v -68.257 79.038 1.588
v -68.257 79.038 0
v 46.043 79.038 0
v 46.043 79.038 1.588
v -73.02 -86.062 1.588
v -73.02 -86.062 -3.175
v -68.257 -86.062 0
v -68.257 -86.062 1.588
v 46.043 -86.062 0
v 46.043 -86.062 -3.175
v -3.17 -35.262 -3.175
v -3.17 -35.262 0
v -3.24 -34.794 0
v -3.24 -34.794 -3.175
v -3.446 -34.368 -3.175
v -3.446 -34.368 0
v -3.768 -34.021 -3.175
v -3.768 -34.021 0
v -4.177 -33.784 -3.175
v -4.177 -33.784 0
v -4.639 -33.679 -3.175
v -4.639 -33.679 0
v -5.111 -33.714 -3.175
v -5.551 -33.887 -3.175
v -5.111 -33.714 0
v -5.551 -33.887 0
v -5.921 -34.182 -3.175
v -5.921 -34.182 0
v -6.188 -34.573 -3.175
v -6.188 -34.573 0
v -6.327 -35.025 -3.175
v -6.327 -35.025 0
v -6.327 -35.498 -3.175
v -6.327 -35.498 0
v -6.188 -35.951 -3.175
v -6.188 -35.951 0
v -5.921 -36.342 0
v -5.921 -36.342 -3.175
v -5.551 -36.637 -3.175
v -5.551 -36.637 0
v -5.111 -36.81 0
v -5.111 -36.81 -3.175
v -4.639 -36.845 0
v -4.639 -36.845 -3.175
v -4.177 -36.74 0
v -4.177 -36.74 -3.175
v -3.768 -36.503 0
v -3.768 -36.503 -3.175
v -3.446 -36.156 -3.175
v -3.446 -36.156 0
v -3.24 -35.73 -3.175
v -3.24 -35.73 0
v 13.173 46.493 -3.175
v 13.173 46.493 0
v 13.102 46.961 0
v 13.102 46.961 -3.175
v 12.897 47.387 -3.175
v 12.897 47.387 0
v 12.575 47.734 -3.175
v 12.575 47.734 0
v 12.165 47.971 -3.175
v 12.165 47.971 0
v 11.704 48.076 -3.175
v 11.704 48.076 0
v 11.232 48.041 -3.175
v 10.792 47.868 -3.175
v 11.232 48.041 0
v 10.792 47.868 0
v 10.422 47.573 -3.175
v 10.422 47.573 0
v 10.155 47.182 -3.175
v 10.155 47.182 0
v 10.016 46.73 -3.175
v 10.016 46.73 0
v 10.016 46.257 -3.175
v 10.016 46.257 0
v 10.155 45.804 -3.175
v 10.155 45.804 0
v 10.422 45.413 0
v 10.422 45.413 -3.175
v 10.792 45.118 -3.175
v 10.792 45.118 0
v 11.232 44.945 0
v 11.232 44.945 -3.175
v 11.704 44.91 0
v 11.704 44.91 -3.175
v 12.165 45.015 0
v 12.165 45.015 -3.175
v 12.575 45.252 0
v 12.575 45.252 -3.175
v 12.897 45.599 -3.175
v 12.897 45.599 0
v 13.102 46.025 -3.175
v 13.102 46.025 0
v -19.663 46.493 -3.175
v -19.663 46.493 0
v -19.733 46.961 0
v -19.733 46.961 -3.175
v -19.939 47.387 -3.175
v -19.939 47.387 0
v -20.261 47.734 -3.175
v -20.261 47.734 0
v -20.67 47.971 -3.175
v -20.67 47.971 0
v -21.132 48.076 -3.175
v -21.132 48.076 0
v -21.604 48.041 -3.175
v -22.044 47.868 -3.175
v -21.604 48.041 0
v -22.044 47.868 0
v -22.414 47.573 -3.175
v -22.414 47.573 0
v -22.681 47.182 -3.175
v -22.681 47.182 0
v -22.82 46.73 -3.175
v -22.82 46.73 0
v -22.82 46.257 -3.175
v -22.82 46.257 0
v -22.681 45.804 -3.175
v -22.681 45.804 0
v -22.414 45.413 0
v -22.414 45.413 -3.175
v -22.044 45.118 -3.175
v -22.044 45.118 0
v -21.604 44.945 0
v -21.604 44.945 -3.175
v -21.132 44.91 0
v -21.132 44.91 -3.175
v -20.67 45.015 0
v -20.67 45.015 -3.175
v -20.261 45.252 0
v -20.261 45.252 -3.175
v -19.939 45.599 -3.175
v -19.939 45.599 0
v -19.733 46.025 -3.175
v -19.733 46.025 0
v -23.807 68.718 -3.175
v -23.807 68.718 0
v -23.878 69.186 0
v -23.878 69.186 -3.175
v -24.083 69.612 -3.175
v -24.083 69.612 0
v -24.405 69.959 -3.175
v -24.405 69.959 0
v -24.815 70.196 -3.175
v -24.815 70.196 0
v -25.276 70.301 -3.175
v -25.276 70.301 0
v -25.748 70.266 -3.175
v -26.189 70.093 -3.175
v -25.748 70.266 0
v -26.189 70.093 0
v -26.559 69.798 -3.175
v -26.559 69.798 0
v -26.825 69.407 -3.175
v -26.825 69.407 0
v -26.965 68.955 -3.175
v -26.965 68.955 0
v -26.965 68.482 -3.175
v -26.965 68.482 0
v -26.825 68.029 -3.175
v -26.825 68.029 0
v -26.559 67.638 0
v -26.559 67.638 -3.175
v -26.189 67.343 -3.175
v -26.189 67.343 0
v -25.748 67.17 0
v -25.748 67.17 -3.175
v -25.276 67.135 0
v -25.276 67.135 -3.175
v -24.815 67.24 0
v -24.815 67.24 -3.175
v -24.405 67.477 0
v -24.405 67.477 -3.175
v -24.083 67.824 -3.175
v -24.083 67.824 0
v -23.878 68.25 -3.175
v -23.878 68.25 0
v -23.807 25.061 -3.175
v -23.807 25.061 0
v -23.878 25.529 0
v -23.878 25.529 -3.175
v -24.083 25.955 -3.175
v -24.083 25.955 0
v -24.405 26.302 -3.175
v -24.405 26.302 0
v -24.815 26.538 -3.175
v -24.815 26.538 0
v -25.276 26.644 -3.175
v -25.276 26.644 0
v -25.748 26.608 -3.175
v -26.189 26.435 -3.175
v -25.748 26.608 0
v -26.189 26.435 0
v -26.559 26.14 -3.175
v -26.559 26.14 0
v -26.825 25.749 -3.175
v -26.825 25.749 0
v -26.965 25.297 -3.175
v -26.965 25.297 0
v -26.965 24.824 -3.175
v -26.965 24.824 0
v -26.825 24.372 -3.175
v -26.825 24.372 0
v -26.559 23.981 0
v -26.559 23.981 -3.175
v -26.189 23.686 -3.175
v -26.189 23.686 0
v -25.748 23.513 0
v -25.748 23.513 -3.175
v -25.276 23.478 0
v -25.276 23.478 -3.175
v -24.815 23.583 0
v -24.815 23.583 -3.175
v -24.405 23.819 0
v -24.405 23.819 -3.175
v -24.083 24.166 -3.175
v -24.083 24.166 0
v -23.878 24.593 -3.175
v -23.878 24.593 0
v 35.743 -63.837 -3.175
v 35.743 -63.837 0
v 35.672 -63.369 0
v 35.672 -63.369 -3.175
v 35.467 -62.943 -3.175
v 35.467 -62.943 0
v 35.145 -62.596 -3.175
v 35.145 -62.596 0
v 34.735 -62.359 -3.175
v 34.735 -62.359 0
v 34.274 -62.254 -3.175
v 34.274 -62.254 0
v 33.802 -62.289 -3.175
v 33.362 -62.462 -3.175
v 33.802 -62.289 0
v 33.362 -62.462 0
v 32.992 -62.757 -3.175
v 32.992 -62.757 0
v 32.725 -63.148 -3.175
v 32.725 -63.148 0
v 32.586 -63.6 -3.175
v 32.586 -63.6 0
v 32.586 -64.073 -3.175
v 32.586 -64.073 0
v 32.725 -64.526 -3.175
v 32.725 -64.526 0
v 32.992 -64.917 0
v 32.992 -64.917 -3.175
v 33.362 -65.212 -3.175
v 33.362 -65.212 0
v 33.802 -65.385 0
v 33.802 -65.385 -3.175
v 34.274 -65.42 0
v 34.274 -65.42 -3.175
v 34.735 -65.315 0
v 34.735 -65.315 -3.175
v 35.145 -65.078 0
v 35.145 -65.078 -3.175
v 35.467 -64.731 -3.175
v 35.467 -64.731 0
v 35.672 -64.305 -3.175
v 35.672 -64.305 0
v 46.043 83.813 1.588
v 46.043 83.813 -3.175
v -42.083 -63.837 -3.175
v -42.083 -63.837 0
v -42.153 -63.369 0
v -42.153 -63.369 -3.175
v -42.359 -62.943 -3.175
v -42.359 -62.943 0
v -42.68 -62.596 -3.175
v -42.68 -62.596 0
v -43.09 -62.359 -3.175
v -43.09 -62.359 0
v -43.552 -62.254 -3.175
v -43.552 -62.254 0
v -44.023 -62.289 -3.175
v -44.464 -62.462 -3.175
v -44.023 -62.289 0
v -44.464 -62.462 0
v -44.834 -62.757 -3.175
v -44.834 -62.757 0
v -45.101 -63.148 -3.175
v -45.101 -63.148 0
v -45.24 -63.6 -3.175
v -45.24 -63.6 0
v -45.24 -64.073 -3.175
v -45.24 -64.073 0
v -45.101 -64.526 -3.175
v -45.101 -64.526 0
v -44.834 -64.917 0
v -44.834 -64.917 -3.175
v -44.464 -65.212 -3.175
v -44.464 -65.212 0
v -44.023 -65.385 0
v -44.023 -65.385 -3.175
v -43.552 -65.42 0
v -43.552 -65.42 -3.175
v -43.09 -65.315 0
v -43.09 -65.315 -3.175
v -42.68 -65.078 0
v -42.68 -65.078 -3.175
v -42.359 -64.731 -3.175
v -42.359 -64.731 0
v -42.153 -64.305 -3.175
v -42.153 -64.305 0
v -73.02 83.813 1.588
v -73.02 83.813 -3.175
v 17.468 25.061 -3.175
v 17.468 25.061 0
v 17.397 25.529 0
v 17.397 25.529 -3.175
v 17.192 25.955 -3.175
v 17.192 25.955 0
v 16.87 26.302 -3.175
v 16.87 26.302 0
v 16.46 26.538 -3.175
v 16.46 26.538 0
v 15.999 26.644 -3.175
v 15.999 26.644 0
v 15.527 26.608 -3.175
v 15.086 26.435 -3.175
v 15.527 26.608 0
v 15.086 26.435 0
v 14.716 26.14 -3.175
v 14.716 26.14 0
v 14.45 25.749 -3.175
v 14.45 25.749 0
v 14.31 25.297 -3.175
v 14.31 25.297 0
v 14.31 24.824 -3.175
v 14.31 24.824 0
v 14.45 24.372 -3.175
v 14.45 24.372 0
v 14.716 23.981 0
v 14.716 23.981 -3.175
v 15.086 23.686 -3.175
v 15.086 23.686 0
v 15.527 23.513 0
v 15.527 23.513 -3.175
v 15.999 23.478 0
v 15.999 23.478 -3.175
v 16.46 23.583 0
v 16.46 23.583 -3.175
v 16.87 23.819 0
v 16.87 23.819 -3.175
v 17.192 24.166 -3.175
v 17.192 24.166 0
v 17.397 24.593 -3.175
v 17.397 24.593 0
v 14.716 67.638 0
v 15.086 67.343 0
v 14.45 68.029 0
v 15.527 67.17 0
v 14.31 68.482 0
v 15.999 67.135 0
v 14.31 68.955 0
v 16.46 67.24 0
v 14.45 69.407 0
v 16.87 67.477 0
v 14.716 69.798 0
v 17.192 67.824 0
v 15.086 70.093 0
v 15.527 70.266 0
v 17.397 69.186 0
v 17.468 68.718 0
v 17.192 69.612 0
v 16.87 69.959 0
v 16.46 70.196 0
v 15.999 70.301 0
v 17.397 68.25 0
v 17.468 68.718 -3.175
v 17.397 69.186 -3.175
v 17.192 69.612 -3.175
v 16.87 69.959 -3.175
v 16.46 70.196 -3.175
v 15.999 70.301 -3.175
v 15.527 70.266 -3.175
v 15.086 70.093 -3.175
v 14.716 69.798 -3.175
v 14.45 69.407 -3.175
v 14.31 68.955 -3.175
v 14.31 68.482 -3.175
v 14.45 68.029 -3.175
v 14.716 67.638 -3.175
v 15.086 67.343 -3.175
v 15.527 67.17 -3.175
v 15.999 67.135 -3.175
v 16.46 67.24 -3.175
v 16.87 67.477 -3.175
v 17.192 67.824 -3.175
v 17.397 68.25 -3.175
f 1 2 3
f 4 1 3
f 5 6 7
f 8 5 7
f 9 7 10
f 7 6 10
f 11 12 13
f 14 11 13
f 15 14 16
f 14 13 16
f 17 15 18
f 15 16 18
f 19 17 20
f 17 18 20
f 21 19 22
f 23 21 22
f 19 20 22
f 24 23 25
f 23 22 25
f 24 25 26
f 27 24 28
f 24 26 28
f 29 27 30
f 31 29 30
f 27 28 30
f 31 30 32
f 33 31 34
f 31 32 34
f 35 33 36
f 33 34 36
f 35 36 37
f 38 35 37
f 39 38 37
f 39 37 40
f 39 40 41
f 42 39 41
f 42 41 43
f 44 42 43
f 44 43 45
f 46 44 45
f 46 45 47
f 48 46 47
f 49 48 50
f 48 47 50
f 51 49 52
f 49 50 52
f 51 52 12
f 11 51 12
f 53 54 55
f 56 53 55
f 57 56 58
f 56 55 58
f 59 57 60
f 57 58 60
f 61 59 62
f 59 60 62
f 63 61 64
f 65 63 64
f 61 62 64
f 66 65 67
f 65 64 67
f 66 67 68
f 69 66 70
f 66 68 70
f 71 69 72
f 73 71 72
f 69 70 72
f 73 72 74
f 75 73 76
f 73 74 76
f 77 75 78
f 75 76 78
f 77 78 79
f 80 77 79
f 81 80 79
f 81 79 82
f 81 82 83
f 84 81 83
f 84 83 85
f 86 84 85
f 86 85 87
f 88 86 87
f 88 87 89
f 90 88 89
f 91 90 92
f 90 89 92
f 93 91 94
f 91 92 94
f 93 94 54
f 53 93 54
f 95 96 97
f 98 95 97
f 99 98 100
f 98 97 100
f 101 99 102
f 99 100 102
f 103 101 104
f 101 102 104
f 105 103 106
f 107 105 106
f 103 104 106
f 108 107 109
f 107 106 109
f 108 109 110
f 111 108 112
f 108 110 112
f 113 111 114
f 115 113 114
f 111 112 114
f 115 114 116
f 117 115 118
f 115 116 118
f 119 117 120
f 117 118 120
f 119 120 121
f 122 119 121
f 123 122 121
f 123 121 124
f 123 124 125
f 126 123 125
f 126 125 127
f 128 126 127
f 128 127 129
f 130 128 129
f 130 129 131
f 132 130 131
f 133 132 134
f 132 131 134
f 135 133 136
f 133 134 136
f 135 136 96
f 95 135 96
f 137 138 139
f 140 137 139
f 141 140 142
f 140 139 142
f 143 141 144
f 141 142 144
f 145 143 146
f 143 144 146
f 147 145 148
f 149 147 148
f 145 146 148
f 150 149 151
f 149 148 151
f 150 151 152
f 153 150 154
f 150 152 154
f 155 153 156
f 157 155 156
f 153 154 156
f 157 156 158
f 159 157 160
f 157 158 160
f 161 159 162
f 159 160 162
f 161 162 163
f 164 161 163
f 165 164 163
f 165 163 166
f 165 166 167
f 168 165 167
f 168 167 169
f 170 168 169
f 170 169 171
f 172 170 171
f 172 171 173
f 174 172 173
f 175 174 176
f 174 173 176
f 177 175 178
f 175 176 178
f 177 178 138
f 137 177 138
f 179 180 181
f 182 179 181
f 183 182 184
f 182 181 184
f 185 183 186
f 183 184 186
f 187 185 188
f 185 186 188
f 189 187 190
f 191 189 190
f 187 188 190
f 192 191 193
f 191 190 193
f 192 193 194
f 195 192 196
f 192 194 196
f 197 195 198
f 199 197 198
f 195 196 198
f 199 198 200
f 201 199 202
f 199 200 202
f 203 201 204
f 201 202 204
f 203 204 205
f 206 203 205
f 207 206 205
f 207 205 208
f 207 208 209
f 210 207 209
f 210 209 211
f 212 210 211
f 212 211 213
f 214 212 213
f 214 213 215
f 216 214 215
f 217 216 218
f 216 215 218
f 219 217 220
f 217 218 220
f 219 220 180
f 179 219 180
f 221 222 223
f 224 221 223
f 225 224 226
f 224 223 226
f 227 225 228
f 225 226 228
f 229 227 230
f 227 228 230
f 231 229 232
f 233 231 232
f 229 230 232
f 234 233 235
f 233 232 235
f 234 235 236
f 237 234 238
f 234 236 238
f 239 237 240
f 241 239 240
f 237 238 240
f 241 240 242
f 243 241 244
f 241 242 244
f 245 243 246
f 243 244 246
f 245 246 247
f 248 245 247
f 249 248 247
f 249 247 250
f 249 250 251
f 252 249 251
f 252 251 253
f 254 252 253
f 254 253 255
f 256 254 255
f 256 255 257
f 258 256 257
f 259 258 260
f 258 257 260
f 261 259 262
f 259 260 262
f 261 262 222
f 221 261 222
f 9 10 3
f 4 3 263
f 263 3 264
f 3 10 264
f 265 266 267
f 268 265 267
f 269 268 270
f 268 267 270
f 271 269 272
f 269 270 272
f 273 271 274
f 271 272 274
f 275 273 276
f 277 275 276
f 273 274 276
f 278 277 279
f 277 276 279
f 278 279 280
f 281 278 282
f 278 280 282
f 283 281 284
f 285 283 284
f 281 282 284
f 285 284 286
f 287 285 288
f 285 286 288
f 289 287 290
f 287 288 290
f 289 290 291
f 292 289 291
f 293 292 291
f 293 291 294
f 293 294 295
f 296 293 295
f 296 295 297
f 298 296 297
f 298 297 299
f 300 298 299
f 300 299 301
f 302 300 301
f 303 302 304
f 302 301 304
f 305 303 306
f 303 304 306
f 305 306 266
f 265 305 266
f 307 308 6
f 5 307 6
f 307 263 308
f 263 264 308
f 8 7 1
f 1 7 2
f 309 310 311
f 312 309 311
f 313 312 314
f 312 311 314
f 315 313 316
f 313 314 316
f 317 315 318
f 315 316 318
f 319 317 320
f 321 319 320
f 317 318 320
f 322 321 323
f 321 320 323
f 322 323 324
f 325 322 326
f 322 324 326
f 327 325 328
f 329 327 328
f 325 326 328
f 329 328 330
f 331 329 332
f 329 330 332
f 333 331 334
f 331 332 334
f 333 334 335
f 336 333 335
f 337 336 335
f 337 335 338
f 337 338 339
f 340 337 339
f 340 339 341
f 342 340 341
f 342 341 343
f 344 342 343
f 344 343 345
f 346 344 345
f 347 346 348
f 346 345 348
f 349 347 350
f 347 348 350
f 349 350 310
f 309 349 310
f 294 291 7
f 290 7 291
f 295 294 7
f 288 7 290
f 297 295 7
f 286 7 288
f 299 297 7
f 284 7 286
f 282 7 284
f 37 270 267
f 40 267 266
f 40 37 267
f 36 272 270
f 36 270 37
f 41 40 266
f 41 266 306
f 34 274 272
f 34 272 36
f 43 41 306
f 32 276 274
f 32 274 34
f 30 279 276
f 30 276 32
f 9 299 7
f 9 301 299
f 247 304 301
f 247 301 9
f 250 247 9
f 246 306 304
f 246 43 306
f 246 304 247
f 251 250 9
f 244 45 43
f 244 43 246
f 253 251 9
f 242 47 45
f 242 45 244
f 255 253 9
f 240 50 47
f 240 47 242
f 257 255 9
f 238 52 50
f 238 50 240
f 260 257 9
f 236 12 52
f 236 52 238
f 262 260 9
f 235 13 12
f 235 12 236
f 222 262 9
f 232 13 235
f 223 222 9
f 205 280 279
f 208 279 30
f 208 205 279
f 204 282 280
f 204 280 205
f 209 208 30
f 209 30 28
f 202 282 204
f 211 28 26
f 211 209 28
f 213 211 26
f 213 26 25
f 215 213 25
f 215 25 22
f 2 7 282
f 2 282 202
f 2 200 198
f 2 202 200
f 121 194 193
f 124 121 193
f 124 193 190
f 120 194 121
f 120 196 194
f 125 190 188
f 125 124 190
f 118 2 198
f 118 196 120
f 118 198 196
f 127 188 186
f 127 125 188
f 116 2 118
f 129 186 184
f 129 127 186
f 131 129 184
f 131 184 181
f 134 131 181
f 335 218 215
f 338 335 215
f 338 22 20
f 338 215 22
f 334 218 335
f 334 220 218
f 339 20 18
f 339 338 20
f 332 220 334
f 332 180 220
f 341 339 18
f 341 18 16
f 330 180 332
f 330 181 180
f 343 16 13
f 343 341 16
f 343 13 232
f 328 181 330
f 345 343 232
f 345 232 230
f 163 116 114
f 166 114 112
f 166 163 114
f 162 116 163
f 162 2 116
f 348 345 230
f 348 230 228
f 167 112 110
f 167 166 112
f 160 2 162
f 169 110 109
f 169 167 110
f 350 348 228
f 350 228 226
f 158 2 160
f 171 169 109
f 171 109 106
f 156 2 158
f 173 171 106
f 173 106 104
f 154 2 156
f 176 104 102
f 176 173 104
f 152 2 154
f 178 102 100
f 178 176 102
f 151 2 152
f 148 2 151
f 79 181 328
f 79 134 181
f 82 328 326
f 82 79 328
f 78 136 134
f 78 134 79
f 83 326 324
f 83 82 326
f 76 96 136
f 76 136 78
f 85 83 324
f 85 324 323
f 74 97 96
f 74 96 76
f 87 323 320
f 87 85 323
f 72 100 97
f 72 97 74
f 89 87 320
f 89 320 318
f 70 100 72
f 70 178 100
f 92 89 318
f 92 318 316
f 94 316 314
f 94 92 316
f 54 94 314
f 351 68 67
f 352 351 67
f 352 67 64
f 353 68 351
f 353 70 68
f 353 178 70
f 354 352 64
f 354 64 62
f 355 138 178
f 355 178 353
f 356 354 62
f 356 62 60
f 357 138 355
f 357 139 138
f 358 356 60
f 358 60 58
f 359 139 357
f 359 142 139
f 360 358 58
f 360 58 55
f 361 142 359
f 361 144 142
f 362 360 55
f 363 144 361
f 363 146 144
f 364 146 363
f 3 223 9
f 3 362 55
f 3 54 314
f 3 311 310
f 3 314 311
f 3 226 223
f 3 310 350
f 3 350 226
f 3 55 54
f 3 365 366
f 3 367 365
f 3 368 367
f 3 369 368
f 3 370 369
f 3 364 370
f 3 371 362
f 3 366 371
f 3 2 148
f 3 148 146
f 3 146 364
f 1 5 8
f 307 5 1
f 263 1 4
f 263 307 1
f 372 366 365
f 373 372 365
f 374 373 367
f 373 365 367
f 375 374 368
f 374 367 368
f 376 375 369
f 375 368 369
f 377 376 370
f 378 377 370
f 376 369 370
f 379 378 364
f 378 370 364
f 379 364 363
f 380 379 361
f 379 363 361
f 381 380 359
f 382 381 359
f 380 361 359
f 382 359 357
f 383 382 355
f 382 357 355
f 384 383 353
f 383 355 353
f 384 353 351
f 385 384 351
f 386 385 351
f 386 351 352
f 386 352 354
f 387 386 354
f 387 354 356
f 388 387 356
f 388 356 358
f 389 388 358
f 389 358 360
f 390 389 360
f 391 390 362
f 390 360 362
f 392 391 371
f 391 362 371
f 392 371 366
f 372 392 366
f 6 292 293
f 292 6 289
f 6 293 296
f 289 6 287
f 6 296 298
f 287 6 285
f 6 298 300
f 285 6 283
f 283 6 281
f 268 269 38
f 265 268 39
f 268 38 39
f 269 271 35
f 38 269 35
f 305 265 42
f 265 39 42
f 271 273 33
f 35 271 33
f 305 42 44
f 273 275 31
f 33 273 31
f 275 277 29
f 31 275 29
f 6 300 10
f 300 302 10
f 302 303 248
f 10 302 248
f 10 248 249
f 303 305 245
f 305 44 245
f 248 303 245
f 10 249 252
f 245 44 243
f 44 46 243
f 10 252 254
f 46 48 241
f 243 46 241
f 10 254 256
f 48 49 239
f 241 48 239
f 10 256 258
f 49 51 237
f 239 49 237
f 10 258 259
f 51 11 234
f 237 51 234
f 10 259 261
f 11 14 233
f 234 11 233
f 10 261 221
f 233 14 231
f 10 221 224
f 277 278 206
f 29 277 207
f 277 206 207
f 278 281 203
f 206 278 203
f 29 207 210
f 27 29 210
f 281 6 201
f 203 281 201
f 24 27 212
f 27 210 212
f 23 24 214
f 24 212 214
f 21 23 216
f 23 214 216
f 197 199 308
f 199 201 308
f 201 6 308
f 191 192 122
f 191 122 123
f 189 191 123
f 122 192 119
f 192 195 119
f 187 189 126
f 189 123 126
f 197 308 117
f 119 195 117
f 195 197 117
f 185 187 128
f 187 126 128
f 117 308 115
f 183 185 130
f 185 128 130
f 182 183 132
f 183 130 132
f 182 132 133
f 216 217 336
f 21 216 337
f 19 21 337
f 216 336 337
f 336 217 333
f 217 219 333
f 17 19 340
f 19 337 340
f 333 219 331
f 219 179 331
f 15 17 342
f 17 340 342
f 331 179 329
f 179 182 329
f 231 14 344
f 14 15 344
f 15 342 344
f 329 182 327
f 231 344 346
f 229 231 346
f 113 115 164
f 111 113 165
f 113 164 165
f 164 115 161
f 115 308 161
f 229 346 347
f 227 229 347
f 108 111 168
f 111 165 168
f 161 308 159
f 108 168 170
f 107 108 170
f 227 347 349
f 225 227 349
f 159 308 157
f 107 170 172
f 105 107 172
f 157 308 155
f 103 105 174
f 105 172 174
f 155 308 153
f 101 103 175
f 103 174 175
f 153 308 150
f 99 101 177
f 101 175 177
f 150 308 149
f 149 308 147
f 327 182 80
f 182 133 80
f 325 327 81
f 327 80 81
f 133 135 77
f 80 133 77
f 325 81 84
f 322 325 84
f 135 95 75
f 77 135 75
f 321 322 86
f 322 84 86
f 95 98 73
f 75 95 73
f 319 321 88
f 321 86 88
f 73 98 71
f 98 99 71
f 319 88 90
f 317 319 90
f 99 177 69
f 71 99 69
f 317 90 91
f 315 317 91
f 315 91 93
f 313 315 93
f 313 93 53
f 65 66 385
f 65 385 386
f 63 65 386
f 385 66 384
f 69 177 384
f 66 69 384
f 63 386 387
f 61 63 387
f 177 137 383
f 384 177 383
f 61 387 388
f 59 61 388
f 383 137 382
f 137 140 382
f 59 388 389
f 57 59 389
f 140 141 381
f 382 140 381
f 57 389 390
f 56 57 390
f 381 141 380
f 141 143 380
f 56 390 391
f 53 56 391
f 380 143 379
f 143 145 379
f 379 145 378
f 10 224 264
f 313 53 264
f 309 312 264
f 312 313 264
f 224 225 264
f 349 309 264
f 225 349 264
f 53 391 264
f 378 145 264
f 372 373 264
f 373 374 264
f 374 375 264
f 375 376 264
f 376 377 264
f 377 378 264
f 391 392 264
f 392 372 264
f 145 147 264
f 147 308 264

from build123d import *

# Parameters (mm, degrees)
F0_W     = 114.3
F0_H     = 165.1
F0_R     = 1.5875
F1_DEPTH = 3.175
F2_DEPTH = 1.5875


with BuildPart() as f1:
    # F0 (on Top) → F1 (new body)
    with BuildSketch(Plane.XY):
        with Locations((-11.107412, -3.511809)):
            Rectangle(F0_W, F0_H)
        with Locations((-43.670212, -63.836809)):
            Circle(F0_R, mode=Mode.SUBTRACT)
        with Locations((34.155388, -63.836809)):
            Circle(F0_R, mode=Mode.SUBTRACT)
        with Locations((-4.757412, -35.261809)):
            Circle(F0_R, mode=Mode.SUBTRACT)
        with Locations((-25.394912, 25.060651)):
            Circle(F0_R, mode=Mode.SUBTRACT)
        with Locations((-21.250462, 46.493171)):
            Circle(F0_R, mode=Mode.SUBTRACT)
        with Locations((-25.394912, 68.718171)):
            Circle(F0_R, mode=Mode.SUBTRACT)
        with Locations((15.880088, 25.060651)):
            Circle(F0_R, mode=Mode.SUBTRACT)
        with Locations((11.585386, 46.493171)):
            Circle(F0_R, mode=Mode.SUBTRACT)
        with Locations((15.880088, 68.718171)):
            Circle(F0_R, mode=Mode.SUBTRACT)
        Polygon((-68.257412, -86.061809), (-68.257412, 79.038191), (46.042588, 79.038191), (46.042588, 83.813391), (-73.019912, 83.813391), (-73.019912, -86.061809), align=None)
    extrude(amount=-F1_DEPTH)

    # F0 (on Top) → F2 (join)
    with BuildSketch(Plane.XY):
        Polygon((-68.257412, -86.061809), (-68.257412, 79.038191), (46.042588, 79.038191), (46.042588, 83.813391), (-73.019912, 83.813391), (-73.019912, -86.061809), align=None)
    extrude(amount=F2_DEPTH)


solid = f1.part
